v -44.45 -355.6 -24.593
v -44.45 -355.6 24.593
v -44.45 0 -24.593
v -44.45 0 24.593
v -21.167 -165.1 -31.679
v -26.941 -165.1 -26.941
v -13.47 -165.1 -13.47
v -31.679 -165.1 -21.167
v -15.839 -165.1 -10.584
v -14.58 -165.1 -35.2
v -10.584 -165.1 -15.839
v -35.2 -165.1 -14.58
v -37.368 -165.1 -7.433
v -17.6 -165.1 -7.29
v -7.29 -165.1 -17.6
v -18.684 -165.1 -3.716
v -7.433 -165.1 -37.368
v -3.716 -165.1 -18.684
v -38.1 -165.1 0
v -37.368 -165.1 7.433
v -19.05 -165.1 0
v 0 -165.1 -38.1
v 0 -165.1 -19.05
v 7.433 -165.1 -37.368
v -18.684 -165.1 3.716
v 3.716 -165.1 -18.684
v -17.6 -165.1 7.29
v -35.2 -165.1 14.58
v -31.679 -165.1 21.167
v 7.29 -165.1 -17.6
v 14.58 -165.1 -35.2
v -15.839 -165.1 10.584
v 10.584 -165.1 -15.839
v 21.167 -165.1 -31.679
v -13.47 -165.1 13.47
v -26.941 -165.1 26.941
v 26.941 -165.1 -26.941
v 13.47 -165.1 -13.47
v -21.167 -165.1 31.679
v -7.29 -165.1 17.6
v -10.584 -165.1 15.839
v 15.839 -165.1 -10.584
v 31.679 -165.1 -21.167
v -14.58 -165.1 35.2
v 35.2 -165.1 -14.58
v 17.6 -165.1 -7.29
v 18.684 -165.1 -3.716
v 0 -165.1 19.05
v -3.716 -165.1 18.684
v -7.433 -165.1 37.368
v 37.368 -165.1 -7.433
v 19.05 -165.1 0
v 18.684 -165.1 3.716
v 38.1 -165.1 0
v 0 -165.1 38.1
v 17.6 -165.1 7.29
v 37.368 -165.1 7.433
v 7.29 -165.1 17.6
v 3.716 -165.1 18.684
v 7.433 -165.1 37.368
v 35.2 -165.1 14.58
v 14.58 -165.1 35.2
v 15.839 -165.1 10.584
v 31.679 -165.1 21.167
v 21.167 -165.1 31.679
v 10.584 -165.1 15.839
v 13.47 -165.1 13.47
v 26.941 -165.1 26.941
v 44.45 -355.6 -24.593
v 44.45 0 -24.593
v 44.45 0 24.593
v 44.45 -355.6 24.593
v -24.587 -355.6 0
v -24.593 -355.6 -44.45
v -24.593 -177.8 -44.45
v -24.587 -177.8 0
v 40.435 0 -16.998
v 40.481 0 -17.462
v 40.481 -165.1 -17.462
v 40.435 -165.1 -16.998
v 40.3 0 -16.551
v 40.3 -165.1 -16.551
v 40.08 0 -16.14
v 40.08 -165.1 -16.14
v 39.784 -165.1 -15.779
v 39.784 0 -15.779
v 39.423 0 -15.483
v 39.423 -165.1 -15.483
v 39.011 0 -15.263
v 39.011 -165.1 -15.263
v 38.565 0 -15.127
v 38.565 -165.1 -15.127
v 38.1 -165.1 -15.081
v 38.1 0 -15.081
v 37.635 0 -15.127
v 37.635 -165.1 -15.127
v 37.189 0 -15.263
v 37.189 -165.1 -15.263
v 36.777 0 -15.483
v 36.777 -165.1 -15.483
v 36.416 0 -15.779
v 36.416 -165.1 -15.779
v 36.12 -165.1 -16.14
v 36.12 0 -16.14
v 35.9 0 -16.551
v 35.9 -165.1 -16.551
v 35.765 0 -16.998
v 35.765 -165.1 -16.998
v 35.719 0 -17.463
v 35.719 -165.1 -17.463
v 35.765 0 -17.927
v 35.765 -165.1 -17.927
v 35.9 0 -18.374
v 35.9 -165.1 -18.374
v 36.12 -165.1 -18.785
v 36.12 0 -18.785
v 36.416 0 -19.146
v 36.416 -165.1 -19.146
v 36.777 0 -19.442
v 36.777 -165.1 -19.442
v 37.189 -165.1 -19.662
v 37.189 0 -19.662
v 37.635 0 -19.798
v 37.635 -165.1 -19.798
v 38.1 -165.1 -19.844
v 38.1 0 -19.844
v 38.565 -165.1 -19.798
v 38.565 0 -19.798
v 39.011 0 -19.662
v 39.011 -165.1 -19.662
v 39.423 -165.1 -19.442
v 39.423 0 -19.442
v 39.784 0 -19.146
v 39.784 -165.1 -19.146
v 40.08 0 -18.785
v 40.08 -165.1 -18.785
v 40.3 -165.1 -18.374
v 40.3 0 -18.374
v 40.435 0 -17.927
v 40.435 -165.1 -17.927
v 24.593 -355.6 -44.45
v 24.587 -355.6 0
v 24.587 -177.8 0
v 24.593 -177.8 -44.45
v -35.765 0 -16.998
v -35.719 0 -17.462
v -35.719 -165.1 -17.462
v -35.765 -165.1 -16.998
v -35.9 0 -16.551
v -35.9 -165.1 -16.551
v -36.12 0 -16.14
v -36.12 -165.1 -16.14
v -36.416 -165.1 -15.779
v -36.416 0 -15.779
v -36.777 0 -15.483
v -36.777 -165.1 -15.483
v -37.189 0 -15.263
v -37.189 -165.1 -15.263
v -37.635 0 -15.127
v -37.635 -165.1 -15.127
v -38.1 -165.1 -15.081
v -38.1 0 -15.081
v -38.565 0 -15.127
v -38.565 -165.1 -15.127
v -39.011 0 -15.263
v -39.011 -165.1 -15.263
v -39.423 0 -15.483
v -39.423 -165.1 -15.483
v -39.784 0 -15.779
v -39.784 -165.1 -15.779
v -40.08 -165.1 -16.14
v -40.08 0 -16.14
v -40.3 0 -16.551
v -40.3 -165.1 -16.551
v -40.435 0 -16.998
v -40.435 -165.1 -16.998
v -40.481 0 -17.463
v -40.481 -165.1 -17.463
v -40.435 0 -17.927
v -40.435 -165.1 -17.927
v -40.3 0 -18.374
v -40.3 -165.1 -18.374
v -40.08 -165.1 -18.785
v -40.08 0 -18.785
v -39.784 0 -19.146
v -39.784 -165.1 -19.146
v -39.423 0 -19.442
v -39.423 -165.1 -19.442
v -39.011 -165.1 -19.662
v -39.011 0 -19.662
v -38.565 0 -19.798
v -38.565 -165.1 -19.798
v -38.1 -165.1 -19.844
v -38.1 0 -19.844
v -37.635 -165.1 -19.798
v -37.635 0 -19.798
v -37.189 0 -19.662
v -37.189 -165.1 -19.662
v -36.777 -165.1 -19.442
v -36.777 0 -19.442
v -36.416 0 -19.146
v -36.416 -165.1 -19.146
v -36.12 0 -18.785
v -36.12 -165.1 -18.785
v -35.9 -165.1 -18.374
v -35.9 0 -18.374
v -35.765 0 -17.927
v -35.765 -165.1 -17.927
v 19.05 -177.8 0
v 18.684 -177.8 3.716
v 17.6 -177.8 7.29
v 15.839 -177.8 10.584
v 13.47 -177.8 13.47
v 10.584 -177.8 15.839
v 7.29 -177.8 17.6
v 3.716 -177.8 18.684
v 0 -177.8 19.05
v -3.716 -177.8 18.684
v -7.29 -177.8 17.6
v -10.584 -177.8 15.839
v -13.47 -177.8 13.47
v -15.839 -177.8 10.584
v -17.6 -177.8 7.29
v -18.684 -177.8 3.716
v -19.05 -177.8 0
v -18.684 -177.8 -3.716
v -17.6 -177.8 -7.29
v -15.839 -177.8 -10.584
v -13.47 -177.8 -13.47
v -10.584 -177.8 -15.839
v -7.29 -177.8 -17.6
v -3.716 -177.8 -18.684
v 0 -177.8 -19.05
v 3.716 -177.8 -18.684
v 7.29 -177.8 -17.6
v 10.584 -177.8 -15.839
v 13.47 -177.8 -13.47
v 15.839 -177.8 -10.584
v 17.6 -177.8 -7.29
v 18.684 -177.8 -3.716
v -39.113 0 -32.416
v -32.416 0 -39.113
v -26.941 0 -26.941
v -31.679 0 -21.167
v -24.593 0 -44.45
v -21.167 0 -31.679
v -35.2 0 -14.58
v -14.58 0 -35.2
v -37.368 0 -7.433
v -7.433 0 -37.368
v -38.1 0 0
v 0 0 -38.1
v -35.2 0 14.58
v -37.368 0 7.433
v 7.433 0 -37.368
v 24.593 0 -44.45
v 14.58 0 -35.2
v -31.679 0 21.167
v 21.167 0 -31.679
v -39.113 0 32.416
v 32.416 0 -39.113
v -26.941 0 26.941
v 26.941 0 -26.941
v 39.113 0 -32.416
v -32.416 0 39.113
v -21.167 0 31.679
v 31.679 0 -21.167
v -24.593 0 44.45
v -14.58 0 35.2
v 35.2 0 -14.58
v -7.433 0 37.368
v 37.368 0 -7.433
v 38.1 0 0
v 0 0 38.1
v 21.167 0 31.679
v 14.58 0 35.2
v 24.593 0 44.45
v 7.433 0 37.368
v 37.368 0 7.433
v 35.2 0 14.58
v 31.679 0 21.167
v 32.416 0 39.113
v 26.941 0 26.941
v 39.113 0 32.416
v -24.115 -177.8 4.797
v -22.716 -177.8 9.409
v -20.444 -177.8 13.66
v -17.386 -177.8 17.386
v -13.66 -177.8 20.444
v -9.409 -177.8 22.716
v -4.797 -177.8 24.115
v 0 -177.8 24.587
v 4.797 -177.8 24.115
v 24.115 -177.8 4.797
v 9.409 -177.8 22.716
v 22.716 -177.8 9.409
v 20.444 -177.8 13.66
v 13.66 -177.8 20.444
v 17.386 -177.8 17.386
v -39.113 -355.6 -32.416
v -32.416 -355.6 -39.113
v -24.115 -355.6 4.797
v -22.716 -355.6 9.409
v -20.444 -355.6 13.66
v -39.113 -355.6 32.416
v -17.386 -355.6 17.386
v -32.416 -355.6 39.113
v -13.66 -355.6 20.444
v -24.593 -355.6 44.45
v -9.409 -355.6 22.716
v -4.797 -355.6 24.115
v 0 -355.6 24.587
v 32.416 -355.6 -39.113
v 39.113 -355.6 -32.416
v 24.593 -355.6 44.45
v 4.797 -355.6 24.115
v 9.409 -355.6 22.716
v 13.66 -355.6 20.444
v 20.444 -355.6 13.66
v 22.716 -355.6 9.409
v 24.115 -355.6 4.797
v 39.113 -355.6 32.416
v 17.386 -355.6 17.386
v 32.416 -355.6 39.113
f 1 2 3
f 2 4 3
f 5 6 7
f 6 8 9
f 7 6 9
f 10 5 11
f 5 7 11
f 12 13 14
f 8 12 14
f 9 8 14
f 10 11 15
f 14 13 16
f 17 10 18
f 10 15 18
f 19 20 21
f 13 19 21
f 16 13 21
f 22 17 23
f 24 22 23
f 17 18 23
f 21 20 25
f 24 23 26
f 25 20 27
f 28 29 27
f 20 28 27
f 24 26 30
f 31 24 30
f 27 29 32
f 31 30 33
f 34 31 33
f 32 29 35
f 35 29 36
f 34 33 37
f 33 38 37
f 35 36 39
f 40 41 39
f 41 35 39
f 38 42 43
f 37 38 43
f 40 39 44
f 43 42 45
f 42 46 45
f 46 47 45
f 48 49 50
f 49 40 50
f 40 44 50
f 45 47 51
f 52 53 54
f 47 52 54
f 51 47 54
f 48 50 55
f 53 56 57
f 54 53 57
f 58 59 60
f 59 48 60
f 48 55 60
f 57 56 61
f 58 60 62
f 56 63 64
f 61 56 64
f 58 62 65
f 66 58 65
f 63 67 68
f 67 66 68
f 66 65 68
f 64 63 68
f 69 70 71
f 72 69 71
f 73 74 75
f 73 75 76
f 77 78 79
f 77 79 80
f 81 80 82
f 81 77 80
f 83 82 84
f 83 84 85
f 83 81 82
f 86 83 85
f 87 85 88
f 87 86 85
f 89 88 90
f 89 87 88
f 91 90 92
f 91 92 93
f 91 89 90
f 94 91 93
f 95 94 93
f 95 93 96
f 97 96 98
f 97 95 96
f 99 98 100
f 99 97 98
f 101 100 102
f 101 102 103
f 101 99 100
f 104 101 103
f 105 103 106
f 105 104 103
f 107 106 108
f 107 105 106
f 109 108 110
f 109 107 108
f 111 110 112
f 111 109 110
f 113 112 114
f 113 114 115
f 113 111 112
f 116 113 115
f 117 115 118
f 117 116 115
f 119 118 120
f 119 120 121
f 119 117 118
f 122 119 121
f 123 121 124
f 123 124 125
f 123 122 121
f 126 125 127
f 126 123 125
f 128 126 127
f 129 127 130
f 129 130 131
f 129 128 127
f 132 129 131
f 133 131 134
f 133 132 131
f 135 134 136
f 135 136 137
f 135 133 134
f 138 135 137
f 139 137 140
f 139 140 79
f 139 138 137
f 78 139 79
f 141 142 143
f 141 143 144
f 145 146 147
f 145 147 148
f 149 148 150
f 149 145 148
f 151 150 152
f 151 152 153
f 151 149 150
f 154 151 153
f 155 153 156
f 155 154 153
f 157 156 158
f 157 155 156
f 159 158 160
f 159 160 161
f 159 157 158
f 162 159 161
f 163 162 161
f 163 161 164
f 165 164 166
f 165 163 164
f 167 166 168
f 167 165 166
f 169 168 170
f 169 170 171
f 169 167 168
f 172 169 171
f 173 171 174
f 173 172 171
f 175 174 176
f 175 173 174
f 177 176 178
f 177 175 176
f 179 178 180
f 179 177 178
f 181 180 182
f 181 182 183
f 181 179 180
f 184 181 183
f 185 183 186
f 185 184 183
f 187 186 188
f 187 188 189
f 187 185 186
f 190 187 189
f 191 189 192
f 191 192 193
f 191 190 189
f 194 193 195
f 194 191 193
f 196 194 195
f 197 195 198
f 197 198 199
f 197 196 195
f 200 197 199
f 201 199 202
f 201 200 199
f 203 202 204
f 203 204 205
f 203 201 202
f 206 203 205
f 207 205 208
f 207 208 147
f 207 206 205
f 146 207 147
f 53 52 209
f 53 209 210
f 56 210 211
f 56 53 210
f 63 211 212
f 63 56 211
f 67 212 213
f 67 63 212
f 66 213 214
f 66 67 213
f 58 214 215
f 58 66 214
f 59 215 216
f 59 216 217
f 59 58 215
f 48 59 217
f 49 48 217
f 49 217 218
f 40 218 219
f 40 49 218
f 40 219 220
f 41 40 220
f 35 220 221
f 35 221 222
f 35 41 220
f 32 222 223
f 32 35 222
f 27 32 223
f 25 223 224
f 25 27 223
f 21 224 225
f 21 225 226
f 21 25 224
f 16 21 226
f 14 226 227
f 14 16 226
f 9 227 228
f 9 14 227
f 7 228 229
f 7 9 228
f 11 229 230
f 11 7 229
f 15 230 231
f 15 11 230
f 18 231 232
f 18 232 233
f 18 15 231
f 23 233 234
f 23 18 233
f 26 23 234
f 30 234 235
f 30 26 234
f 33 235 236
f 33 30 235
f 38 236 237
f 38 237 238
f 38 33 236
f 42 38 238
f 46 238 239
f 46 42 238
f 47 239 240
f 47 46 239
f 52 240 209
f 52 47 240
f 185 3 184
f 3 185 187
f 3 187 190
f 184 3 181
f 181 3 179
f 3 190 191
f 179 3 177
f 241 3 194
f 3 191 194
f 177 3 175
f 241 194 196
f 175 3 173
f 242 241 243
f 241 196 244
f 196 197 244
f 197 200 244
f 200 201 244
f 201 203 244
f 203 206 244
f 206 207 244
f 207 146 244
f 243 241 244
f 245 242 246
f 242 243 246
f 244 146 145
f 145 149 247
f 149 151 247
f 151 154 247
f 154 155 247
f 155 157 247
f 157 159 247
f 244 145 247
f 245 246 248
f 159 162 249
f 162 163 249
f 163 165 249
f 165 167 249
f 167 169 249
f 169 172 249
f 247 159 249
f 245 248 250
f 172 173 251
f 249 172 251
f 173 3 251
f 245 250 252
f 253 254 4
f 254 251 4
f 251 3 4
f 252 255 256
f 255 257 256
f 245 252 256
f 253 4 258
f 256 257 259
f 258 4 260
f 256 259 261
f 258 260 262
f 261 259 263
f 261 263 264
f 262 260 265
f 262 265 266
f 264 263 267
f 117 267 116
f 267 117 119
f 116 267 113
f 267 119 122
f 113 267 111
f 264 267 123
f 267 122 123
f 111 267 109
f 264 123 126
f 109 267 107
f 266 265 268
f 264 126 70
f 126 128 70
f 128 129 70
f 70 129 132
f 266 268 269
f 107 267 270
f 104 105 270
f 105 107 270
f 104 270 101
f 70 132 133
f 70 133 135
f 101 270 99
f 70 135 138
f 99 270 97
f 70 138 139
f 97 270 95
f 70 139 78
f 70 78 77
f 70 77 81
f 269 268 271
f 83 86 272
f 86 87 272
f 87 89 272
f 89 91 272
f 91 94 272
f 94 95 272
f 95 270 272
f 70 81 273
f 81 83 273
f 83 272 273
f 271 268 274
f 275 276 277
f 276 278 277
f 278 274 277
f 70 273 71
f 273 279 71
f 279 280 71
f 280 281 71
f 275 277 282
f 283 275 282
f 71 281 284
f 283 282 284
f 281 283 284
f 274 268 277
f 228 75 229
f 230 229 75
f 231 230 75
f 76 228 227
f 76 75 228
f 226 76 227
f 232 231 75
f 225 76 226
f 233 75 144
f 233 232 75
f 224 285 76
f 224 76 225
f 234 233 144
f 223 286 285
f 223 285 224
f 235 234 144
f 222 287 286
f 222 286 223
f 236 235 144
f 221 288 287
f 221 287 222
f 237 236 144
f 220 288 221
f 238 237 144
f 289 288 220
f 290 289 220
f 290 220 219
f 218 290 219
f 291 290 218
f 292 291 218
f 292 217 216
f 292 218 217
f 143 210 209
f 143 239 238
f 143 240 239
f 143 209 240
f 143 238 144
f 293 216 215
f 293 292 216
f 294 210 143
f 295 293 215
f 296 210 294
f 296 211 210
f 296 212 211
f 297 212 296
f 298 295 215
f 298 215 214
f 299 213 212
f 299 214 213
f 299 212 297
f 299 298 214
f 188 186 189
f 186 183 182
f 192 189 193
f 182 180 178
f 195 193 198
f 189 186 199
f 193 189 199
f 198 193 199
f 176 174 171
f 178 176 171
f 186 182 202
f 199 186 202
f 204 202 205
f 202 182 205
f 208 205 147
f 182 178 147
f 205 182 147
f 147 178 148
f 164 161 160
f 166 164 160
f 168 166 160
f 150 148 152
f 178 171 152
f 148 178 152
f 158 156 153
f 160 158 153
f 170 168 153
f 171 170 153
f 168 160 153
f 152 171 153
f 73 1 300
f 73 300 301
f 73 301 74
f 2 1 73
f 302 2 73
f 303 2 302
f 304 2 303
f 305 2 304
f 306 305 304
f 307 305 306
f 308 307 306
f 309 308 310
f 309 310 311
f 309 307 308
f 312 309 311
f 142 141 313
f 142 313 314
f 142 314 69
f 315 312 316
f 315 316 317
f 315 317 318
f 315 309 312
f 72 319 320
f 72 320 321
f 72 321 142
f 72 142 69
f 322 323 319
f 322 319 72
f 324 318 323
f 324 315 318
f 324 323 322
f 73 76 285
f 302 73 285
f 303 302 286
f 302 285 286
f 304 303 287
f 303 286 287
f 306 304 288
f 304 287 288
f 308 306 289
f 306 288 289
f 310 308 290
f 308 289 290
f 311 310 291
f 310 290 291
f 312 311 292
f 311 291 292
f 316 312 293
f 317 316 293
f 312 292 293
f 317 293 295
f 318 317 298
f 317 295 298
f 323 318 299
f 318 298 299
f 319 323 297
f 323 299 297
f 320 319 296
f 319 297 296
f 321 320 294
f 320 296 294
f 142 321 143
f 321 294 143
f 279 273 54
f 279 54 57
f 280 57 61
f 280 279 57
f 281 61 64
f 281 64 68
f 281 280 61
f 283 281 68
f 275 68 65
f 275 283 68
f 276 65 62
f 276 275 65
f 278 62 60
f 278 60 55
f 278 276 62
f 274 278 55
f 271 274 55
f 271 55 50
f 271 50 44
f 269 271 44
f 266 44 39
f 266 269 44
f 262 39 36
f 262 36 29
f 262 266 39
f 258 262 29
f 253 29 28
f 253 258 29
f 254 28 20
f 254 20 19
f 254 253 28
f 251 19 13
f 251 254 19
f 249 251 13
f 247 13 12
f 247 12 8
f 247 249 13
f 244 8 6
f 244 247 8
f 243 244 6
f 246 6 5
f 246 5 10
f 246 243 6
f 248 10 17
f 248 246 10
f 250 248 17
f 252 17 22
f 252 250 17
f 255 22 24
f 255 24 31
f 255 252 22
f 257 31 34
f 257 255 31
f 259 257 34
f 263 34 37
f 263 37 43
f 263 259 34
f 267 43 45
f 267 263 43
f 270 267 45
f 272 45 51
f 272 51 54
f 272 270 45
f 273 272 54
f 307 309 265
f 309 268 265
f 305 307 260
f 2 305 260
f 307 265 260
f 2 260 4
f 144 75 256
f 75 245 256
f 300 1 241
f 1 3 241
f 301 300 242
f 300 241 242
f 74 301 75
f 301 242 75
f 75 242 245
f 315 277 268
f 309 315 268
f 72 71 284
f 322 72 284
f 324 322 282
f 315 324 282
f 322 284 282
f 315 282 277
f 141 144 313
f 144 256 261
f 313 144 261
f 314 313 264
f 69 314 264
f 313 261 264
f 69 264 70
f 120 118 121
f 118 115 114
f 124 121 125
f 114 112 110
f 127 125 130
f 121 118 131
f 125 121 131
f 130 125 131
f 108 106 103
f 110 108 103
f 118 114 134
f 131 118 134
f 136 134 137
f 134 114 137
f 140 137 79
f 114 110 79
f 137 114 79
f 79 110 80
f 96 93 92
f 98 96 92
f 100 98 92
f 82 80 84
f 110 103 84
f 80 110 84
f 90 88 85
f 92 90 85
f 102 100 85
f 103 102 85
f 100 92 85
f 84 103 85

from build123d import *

# Parameters (mm, degrees)
F0_R     = 2.38125
F0_R_2   = 38.1
F1_DEPTH = 165.1
F2_R     = 19.05
F3_DEPTH = 12.7
F5_DEPTH = 177.8


with BuildPart() as f1:
    # F0 (on Front) → F1 (new body)
    with BuildSketch(Plane.XZ):
        with BuildLine():
            Line((24.593444, 44.45), (-24.593444, 44.45))
            ThreePointArc((-24.593444, 44.45), (-35.921024, 35.921024), (-44.45, 24.593444))
            Line((-44.45, 24.593444), (-44.45, -24.593444))
            ThreePointArc((-44.45, -24.593444), (-35.921024, -35.921024), (-24.593444, -44.45))
            Line((-24.593444, -44.45), (24.593444, -44.45))
            ThreePointArc((24.593444, -44.45), (35.921024, -35.921024), (44.45, -24.593444))
            Line((44.45, -24.593444), (44.45, 24.593444))
            ThreePointArc((44.45, 24.593444), (35.921024, 35.921024), (24.593444, 44.45))
        make_face()
        with Locations((-38.1, -17.4625)):
            Circle(F0_R, mode=Mode.SUBTRACT)
        with Locations((38.1, -17.4625)):
            Circle(F0_R, mode=Mode.SUBTRACT)
        Circle(F0_R_2, mode=Mode.SUBTRACT)
    extrude(amount=F1_DEPTH)

    # F2 (on face) → F3 (join)
    with BuildSketch(Plane.XZ.offset(165.1)):
        with BuildLine():
            Line((24.593444, 44.45), (-24.593444, 44.45))
            ThreePointArc((-24.593444, 44.45), (-35.921024, 35.921024), (-44.45, 24.593444))
            Line((-44.45, 24.593444), (-44.45, -24.593444))
            ThreePointArc((-44.45, -24.593444), (-35.921024, -35.921024), (-24.593444, -44.45))
            Line((-24.593444, -44.45), (24.593444, -44.45))
            ThreePointArc((24.593444, -44.45), (35.921024, -35.921024), (44.45, -24.593444))
            Line((44.45, -24.593444), (44.45, 24.593444))
            ThreePointArc((44.45, 24.593444), (35.921024, 35.921024), (24.593444, 44.45))
        make_face()
        Circle(F2_R, mode=Mode.SUBTRACT)
    extrude(amount=F3_DEPTH)

    # F4 (on face) → F5 (join)
    with BuildSketch(Plane.XZ.offset(177.8)):
        with BuildLine():
            Line((24.593444, 44.45), (-24.593444, 44.45))
            ThreePointArc((-24.593444, 44.45), (-35.921024, 35.921024), (-44.45, 24.593444))
            Line((-44.45, 24.593444), (-44.45, -24.593444))
            ThreePointArc((-44.45, -24.593444), (-35.921024, -35.921024), (-24.593444, -44.45))
            Line((-24.593444, -44.45), (-24.5872, 0))
            ThreePointArc((-24.5872, 0), (0, 24.5872), (24.5872, 0))
            Line((24.5872, 0), (24.593444, -44.45))
            ThreePointArc((24.593444, -44.45), (35.921024, -35.921024), (44.45, -24.593444))
            Line((44.45, -24.593444), (44.45, 24.593444))
            ThreePointArc((44.45, 24.593444), (35.921024, 35.921024), (24.593444, 44.45))
        make_face()
    extrude(amount=F5_DEPTH)


solid = f1.part
